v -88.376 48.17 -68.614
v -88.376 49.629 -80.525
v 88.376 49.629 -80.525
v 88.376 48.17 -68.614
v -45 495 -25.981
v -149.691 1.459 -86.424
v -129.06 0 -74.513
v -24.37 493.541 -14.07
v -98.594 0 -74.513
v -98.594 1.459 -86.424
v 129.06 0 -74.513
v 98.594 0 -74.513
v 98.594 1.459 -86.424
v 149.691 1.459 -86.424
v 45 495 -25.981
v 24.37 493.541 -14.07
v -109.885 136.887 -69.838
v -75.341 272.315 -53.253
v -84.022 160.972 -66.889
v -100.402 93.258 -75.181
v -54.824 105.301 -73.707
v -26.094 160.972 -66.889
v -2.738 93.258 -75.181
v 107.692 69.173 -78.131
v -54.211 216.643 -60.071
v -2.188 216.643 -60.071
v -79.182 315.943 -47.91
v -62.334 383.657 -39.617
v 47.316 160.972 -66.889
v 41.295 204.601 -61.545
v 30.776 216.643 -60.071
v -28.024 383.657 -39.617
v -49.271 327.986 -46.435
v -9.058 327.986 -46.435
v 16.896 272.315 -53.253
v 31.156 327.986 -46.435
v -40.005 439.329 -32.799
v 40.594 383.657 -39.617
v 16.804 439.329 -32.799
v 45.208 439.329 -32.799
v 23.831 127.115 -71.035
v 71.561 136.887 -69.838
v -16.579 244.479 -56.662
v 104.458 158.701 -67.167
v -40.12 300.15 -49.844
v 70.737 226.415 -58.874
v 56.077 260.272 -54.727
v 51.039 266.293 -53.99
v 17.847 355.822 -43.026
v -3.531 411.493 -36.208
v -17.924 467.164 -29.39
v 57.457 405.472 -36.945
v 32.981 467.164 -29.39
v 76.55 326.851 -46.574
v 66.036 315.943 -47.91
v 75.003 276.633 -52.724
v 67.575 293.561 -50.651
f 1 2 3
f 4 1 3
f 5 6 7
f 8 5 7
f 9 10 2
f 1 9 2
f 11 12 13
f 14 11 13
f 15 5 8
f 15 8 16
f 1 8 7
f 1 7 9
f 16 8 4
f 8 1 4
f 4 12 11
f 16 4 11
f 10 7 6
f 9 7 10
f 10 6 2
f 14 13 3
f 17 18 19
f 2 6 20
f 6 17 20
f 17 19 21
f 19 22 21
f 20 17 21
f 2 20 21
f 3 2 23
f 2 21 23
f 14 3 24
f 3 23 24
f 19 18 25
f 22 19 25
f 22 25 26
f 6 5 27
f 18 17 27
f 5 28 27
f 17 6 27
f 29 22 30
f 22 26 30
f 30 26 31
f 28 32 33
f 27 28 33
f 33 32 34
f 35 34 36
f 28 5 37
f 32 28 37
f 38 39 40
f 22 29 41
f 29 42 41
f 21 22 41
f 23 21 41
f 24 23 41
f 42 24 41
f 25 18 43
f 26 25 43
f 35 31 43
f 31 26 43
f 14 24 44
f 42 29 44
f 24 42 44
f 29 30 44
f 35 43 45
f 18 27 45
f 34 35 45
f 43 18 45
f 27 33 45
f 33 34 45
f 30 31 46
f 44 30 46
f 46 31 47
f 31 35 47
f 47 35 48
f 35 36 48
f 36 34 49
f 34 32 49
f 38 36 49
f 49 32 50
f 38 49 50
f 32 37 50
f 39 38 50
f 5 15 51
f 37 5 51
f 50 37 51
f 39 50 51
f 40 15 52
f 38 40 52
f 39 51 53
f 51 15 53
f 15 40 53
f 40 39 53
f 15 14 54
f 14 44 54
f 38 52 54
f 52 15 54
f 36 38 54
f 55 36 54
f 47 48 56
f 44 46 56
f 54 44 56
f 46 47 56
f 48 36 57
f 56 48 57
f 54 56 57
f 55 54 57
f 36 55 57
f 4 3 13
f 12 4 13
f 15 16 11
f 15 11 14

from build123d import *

# Parameters (mm, degrees)
F7_R      = 411.1162199172
F8_DEPTH  = 245.8819093104
F10_DEPTH = 72.1732122579
F13_R     = 303.0795059163
F14_DEPTH = 62.9709492631
F16_R     = 347.3761175619
F17_DEPTH = 62.9709492631
F18_W     = 90
F18_H     = 35.3622667967
F19_DEPTH = 72.1732122579
F20_W     = 378.0467361212
F20_H     = 51.6974163429
F21_DEPTH = 72.1732122579


with BuildPart() as f5:
    # F1 (on Front) → F5 section 0
    with BuildSketch(Plane.XZ):
        Polygon((-150, -86.6025403784), (150, -86.6025403784), (0, 173.2050807569), align=None)
    # F4 (on line) → F5 section 1
    with BuildSketch(Plane(origin=(0, 495, 0), x_dir=(-1, 0, 0), z_dir=(0, 1, 0))):
        Polygon((-45, -25.9807621135), (45, -25.9807621135), (0, 51.9615242271), align=None)
    loft()

    # F7 (on face) → F8 (cut, through all)
    with BuildSketch(Plane(origin=(0, 8.9906162556, -73.4118195457), x_dir=(1, 0, 0), z_dir=(0, 0.1215600245, -0.9925840823))):
        with Locations((0, -288.0104482174)):
            Circle(F7_R)
    extrude(amount=-F8_DEPTH, mode=Mode.SUBTRACT)

    # F9 (on face) → F10 (cut, through all)
    with BuildSketch(Plane(origin=(0, 10.4493365501, -85.3228285333), x_dir=(1, 0, 0), z_dir=(0, 0.1215600245, -0.9925840823))):
        Polygon((88.3763476395, -39.4725930665), (98.9037545729, 10.5274069335), (-98.9037545729, 10.5274069335), (-88.3763476395, -39.4725930665), align=None)
    extrude(amount=-F10_DEPTH, mode=Mode.SUBTRACT)

    # F13 (on face) → F14 (cut, through all)
    with BuildSketch(Plane(origin=(0, 0, 0), x_dir=(0.8660254038, 0, 0.5), z_dir=(0.5, 0, -0.8660254038))):
        with Locations((-100.1057326794, -240.2520924807)):
            Circle(F13_R)
    extrude(amount=-F14_DEPTH, mode=Mode.SUBTRACT)

    # F16 (on face) → F17 (cut, through all)
    with BuildSketch(Plane(origin=(0, 0, 0), x_dir=(0.8660254038, 0, -0.5), z_dir=(-0.5, 0, -0.8660254038))):
        with Locations((93.3309048414, -267.9739892483)):
            Circle(F16_R)
    extrude(amount=-F17_DEPTH, mode=Mode.SUBTRACT)

    # F18 (on face) → F19 (cut, through all)
    with BuildSketch(Plane(origin=(0, 10.4493365501, -85.3228285333), x_dir=(1, 0, 0), z_dir=(0, 0.1215600245, -0.9925840823))):
        with Locations((0, -505.8520320565)):
            Rectangle(F18_W, F18_H)
    extrude(amount=-F19_DEPTH, mode=Mode.SUBTRACT)

    # F20 (on face) → F21 (cut, through all)
    with BuildSketch(Plane(origin=(0, 8.9906162556, -73.4118195457), x_dir=(1, 0, 0), z_dir=(0, -0.1215600245, 0.9925840823))):
        with Locations((11.1420080066, -34.9064962379)):
            Rectangle(F20_W, F20_H)
    extrude(amount=-F21_DEPTH, mode=Mode.SUBTRACT)


solid = f5.part
